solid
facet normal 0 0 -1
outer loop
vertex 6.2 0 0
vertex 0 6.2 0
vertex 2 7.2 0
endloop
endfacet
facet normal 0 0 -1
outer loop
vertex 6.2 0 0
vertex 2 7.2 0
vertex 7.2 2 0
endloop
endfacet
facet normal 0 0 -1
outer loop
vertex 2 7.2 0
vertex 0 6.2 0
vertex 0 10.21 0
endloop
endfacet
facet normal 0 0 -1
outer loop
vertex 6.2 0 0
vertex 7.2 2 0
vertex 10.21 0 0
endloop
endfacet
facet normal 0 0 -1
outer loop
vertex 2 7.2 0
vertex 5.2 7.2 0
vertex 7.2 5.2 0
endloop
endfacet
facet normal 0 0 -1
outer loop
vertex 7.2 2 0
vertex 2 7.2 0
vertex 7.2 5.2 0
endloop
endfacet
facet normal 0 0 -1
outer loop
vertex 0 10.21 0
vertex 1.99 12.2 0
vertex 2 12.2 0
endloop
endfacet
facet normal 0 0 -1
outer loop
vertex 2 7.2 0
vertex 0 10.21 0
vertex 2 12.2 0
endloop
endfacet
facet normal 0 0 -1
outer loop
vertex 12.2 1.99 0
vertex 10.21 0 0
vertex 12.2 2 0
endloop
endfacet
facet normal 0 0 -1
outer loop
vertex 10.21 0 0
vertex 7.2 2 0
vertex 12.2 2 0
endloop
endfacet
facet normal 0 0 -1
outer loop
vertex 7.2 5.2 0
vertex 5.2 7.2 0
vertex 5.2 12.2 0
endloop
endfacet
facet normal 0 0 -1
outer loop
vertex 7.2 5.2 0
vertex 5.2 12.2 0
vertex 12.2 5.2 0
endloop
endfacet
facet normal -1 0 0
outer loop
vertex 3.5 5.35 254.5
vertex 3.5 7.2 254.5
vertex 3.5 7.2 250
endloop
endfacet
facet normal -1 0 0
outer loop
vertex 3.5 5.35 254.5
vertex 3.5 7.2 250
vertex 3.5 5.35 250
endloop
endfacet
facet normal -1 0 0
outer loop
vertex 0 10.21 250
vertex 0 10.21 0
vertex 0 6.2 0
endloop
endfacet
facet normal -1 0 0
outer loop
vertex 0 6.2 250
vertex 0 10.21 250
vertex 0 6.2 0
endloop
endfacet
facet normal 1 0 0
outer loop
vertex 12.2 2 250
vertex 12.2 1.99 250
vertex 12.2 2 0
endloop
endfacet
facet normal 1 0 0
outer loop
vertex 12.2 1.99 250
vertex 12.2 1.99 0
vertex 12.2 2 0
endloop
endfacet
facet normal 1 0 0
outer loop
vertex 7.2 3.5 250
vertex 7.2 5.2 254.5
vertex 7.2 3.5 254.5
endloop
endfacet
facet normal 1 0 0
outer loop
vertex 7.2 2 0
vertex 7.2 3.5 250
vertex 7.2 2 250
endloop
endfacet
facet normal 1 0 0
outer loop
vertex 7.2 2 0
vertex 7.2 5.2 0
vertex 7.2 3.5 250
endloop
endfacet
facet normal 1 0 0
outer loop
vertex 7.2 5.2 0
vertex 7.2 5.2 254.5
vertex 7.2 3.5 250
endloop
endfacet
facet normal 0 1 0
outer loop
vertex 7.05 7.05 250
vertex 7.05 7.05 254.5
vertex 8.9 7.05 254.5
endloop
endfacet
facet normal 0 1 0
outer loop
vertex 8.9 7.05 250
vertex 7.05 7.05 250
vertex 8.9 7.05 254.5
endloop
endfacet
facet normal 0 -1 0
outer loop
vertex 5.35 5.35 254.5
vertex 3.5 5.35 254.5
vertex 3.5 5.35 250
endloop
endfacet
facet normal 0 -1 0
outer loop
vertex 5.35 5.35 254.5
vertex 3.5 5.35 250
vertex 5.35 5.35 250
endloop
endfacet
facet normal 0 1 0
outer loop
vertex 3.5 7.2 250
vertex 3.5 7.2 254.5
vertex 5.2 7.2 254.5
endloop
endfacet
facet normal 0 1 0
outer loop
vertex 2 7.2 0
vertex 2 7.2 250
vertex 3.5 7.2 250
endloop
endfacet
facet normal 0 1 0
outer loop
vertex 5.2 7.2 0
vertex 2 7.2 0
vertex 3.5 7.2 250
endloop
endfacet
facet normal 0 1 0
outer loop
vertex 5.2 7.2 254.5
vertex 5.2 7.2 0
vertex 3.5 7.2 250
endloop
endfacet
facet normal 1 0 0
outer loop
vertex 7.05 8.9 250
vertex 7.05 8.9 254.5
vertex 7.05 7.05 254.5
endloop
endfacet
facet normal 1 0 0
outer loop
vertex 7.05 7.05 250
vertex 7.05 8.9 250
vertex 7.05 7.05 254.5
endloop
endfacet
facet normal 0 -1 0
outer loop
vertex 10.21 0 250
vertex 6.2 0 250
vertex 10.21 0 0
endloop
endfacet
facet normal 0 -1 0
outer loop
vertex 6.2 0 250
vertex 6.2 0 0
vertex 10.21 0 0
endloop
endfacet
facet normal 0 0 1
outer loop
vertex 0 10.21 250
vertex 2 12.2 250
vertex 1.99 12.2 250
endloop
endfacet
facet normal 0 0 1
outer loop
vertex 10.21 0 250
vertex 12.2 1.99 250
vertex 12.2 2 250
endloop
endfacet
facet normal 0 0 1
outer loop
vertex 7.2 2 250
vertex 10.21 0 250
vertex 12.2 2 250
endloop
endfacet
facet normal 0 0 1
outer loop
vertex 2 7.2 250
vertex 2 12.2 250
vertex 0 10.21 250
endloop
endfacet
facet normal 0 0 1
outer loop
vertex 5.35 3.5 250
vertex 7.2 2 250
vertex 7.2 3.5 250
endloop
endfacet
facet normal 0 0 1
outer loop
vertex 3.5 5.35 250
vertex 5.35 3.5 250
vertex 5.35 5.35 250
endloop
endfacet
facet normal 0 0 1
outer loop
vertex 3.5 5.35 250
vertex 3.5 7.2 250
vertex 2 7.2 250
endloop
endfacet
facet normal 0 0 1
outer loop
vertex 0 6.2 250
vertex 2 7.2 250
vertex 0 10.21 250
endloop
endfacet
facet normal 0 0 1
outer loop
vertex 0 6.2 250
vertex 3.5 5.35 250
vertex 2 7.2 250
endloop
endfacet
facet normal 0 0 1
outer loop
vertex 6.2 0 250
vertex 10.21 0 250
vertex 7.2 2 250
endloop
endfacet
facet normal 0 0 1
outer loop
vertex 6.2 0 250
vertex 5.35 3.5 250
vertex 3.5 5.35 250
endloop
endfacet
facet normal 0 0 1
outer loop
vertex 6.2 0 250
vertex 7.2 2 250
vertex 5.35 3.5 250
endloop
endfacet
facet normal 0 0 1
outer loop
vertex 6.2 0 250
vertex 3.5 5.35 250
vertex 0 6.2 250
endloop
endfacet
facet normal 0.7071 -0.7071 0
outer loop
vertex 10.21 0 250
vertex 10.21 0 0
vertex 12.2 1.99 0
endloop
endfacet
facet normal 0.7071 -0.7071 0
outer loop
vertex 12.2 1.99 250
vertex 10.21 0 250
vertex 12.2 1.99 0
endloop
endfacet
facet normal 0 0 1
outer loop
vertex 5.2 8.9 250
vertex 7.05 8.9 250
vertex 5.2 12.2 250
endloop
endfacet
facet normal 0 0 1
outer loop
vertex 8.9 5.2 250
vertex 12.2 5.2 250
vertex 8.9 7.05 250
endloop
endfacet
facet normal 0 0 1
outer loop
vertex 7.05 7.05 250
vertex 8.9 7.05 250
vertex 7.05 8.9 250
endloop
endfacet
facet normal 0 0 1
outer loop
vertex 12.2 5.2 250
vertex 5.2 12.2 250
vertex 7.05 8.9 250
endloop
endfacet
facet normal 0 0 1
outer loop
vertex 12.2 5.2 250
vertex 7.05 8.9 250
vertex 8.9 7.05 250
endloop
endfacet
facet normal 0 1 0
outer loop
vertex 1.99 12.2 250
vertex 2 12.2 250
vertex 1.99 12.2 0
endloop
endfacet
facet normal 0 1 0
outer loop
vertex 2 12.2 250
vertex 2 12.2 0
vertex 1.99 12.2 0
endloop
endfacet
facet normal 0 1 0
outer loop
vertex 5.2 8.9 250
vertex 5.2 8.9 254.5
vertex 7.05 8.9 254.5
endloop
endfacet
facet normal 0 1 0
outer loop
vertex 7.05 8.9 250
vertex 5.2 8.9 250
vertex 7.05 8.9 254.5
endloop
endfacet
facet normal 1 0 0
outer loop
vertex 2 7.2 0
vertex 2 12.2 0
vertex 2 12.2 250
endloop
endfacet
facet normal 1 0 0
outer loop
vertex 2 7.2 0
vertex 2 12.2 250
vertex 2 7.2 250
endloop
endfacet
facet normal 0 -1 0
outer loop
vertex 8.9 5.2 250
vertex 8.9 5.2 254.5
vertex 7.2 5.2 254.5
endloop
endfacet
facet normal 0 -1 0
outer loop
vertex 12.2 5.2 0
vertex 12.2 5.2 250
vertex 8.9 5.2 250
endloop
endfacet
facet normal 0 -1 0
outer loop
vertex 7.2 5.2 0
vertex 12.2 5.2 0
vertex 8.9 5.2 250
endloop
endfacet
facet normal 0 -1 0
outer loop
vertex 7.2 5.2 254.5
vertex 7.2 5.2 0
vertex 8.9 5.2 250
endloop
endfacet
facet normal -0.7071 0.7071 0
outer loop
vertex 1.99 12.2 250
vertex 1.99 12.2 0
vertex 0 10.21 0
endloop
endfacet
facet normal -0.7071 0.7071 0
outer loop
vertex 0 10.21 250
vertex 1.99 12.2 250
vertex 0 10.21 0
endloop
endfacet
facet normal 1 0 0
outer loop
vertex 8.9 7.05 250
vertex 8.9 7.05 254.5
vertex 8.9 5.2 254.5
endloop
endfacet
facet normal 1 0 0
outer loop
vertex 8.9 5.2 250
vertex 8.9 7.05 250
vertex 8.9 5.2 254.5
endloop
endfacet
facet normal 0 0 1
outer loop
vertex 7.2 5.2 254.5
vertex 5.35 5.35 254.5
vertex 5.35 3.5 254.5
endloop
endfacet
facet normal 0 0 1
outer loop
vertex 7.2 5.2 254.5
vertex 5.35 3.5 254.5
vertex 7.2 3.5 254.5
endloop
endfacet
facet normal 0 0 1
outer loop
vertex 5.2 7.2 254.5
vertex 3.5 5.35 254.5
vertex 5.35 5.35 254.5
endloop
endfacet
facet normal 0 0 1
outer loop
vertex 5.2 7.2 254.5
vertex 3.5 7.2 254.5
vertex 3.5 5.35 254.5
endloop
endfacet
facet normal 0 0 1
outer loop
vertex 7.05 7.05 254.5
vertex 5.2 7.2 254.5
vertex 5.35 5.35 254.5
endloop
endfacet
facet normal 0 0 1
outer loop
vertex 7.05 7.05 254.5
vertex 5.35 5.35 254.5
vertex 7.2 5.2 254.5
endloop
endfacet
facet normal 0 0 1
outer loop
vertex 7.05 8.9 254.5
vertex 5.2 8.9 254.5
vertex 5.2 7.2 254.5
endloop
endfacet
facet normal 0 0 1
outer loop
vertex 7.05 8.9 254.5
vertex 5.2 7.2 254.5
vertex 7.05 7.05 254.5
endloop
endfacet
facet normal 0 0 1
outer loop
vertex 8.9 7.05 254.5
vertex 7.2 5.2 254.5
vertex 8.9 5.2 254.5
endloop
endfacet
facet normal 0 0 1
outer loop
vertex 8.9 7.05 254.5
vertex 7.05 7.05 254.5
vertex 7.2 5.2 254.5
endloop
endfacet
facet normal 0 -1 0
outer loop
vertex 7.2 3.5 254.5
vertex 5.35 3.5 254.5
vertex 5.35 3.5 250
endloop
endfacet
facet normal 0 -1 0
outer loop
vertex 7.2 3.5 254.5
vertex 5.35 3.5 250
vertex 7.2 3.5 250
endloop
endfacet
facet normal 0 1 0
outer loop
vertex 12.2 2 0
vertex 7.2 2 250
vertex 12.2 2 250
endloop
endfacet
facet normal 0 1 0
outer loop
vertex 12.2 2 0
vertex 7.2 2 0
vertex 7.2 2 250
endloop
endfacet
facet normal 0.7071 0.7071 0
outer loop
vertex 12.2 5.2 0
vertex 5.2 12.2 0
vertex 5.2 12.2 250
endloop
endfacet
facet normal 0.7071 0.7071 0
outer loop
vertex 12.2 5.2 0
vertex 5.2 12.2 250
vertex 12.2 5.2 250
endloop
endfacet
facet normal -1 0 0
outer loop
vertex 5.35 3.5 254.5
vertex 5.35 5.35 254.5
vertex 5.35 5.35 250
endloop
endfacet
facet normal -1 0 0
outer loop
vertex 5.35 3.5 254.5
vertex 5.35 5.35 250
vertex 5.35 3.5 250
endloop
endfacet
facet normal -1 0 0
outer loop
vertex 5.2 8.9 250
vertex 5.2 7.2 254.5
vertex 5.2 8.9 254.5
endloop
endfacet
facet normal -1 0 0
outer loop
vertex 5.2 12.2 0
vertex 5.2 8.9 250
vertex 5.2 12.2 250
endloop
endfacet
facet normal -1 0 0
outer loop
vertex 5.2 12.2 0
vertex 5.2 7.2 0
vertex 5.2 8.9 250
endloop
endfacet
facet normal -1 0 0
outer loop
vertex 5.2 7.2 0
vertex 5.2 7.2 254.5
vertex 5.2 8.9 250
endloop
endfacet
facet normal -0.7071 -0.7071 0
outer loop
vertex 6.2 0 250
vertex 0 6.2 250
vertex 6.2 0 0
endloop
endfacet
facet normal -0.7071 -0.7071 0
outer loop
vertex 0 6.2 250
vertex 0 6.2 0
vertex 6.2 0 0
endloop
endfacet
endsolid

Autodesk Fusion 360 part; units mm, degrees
sketch "Esquisse1" plane through (0, 0, 0) normal (0, 0, 1) x (1, 0, 0)
  line L0 (2, 12.2) -> (2, 7.2)
  line L1 (2, 7.2) -> (5.2, 7.2)
  line L2 (5.2, 7.2) -> (5.2, 12.2)
  line L3 (2, 12.2) -> (1.99, 12.2)
  line L4 (0, 0) -> (10.6066, 10.6066)
  line L5 (0, 0) -> (15, 0) construction
  line L6 (0, 10.21) -> (0, 6.2)
  line L7 (0, 6.2) -> (3.1, 3.1)
  line L8 (5.2, 12.2) -> (8.7, 8.7)
  line L9 (1.99, 12.2) -> (0, 10.21)
  point P0 (0, 12.2)
  dimension "d1" = 5
  dimension "d2" = 3.2
  dimension "d5" = 7.2
  dimension "d6" = 45
  dimension "d7" = 15
  dimension "d8" = 6
  dimension "d9" = 2
  dimension "d15" = 1.99
  dimension "d16" = 1.99
extrude "Extrusion1" add sketch "Esquisse1" along normal blind 254.5 makes body 1
mirror "Symétrie miroir1" about plane through (3.1, 3.1, 0) normal (-0.7071, 0.7071, 0) of bodies 1 merged
sketch "Esquisse4" plane through (0, 0, 254.5) normal (0, 0, 1) x (-1, 0, 0)
  line L0 (-2, -12.2) -> (-1.99, -12.2)
  line L1 (-1.99, -12.2) -> (0, -10.21)
  line L2 (0, -10.21) -> (0, -6.2)
  line L3 (0, -6.2) -> (-6.2, 0)
  line L4 (-6.2, 0) -> (-10.21, 0)
  line L5 (-10.21, 0) -> (-12.2, -1.99)
  line L6 (-12.2, -1.99) -> (-12.2, -2)
  line L7 (-12.2, -2) -> (-7.2, -2)
  line L8 (-7.2, -2) -> (-7.2, -5.2)
  line L9 (-7.2, -5.2) -> (-12.2, -5.2)
  line L10 (-12.2, -5.2) -> (-5.2, -12.2)
  line L11 (-5.2, -12.2) -> (-5.2, -7.2)
  line L12 (-5.2, -7.2) -> (-2, -7.2)
  line L13 (-2, -7.2) -> (-2, -12.2)
  line L14 (-5.2, -8.9) -> (-7.05, -8.9)
  line L15 (-7.05, -8.9) -> (-7.05, -7.05)
  line L16 (-7.05, -7.05) -> (-8.9, -7.05)
  line L17 (-8.9, -7.05) -> (-8.9, -5.2)
  line L18 (-5.2, -7.2) -> (-7.2, -5.2)
  line L19 (-3.5, -7.2) -> (-3.5, -5.35)
  line L20 (-3.5, -5.35) -> (-5.35, -5.35)
  line L21 (-5.35, -5.35) -> (-5.35, -3.5)
  line L22 (-5.35, -3.5) -> (-7.2, -3.5)
  point P0 (-7.2, -5.2)
  point P1 (-5.2, -7.2)
  point P2 (-7.2, -5.2)
  point P3 (-5.2, -7.2)
  dimension "d23" = 1.85
extrude "Extrusion3" cut sketch "Esquisse4" against normal blind 4.5 contours L0 L1 L2 L3 L4 L5 L6 L7 L8 L12 L13 L19 L20 L21 L22 | L9 L10 L11 L14 L15 L16 L17 bodies 1
copy_body "Corps->Comp2" bodies 1 removing the originals makes body 2 in component "Component"
component "Component" placed x (1, 0, 0) y (0, 1, 0) z (0, 0, 1) at (0, 0, 0)
equation "d5 = d2 + 2 * d9"
equation "d8 = d1 + 1 mm"
equation "d16 = d15"
